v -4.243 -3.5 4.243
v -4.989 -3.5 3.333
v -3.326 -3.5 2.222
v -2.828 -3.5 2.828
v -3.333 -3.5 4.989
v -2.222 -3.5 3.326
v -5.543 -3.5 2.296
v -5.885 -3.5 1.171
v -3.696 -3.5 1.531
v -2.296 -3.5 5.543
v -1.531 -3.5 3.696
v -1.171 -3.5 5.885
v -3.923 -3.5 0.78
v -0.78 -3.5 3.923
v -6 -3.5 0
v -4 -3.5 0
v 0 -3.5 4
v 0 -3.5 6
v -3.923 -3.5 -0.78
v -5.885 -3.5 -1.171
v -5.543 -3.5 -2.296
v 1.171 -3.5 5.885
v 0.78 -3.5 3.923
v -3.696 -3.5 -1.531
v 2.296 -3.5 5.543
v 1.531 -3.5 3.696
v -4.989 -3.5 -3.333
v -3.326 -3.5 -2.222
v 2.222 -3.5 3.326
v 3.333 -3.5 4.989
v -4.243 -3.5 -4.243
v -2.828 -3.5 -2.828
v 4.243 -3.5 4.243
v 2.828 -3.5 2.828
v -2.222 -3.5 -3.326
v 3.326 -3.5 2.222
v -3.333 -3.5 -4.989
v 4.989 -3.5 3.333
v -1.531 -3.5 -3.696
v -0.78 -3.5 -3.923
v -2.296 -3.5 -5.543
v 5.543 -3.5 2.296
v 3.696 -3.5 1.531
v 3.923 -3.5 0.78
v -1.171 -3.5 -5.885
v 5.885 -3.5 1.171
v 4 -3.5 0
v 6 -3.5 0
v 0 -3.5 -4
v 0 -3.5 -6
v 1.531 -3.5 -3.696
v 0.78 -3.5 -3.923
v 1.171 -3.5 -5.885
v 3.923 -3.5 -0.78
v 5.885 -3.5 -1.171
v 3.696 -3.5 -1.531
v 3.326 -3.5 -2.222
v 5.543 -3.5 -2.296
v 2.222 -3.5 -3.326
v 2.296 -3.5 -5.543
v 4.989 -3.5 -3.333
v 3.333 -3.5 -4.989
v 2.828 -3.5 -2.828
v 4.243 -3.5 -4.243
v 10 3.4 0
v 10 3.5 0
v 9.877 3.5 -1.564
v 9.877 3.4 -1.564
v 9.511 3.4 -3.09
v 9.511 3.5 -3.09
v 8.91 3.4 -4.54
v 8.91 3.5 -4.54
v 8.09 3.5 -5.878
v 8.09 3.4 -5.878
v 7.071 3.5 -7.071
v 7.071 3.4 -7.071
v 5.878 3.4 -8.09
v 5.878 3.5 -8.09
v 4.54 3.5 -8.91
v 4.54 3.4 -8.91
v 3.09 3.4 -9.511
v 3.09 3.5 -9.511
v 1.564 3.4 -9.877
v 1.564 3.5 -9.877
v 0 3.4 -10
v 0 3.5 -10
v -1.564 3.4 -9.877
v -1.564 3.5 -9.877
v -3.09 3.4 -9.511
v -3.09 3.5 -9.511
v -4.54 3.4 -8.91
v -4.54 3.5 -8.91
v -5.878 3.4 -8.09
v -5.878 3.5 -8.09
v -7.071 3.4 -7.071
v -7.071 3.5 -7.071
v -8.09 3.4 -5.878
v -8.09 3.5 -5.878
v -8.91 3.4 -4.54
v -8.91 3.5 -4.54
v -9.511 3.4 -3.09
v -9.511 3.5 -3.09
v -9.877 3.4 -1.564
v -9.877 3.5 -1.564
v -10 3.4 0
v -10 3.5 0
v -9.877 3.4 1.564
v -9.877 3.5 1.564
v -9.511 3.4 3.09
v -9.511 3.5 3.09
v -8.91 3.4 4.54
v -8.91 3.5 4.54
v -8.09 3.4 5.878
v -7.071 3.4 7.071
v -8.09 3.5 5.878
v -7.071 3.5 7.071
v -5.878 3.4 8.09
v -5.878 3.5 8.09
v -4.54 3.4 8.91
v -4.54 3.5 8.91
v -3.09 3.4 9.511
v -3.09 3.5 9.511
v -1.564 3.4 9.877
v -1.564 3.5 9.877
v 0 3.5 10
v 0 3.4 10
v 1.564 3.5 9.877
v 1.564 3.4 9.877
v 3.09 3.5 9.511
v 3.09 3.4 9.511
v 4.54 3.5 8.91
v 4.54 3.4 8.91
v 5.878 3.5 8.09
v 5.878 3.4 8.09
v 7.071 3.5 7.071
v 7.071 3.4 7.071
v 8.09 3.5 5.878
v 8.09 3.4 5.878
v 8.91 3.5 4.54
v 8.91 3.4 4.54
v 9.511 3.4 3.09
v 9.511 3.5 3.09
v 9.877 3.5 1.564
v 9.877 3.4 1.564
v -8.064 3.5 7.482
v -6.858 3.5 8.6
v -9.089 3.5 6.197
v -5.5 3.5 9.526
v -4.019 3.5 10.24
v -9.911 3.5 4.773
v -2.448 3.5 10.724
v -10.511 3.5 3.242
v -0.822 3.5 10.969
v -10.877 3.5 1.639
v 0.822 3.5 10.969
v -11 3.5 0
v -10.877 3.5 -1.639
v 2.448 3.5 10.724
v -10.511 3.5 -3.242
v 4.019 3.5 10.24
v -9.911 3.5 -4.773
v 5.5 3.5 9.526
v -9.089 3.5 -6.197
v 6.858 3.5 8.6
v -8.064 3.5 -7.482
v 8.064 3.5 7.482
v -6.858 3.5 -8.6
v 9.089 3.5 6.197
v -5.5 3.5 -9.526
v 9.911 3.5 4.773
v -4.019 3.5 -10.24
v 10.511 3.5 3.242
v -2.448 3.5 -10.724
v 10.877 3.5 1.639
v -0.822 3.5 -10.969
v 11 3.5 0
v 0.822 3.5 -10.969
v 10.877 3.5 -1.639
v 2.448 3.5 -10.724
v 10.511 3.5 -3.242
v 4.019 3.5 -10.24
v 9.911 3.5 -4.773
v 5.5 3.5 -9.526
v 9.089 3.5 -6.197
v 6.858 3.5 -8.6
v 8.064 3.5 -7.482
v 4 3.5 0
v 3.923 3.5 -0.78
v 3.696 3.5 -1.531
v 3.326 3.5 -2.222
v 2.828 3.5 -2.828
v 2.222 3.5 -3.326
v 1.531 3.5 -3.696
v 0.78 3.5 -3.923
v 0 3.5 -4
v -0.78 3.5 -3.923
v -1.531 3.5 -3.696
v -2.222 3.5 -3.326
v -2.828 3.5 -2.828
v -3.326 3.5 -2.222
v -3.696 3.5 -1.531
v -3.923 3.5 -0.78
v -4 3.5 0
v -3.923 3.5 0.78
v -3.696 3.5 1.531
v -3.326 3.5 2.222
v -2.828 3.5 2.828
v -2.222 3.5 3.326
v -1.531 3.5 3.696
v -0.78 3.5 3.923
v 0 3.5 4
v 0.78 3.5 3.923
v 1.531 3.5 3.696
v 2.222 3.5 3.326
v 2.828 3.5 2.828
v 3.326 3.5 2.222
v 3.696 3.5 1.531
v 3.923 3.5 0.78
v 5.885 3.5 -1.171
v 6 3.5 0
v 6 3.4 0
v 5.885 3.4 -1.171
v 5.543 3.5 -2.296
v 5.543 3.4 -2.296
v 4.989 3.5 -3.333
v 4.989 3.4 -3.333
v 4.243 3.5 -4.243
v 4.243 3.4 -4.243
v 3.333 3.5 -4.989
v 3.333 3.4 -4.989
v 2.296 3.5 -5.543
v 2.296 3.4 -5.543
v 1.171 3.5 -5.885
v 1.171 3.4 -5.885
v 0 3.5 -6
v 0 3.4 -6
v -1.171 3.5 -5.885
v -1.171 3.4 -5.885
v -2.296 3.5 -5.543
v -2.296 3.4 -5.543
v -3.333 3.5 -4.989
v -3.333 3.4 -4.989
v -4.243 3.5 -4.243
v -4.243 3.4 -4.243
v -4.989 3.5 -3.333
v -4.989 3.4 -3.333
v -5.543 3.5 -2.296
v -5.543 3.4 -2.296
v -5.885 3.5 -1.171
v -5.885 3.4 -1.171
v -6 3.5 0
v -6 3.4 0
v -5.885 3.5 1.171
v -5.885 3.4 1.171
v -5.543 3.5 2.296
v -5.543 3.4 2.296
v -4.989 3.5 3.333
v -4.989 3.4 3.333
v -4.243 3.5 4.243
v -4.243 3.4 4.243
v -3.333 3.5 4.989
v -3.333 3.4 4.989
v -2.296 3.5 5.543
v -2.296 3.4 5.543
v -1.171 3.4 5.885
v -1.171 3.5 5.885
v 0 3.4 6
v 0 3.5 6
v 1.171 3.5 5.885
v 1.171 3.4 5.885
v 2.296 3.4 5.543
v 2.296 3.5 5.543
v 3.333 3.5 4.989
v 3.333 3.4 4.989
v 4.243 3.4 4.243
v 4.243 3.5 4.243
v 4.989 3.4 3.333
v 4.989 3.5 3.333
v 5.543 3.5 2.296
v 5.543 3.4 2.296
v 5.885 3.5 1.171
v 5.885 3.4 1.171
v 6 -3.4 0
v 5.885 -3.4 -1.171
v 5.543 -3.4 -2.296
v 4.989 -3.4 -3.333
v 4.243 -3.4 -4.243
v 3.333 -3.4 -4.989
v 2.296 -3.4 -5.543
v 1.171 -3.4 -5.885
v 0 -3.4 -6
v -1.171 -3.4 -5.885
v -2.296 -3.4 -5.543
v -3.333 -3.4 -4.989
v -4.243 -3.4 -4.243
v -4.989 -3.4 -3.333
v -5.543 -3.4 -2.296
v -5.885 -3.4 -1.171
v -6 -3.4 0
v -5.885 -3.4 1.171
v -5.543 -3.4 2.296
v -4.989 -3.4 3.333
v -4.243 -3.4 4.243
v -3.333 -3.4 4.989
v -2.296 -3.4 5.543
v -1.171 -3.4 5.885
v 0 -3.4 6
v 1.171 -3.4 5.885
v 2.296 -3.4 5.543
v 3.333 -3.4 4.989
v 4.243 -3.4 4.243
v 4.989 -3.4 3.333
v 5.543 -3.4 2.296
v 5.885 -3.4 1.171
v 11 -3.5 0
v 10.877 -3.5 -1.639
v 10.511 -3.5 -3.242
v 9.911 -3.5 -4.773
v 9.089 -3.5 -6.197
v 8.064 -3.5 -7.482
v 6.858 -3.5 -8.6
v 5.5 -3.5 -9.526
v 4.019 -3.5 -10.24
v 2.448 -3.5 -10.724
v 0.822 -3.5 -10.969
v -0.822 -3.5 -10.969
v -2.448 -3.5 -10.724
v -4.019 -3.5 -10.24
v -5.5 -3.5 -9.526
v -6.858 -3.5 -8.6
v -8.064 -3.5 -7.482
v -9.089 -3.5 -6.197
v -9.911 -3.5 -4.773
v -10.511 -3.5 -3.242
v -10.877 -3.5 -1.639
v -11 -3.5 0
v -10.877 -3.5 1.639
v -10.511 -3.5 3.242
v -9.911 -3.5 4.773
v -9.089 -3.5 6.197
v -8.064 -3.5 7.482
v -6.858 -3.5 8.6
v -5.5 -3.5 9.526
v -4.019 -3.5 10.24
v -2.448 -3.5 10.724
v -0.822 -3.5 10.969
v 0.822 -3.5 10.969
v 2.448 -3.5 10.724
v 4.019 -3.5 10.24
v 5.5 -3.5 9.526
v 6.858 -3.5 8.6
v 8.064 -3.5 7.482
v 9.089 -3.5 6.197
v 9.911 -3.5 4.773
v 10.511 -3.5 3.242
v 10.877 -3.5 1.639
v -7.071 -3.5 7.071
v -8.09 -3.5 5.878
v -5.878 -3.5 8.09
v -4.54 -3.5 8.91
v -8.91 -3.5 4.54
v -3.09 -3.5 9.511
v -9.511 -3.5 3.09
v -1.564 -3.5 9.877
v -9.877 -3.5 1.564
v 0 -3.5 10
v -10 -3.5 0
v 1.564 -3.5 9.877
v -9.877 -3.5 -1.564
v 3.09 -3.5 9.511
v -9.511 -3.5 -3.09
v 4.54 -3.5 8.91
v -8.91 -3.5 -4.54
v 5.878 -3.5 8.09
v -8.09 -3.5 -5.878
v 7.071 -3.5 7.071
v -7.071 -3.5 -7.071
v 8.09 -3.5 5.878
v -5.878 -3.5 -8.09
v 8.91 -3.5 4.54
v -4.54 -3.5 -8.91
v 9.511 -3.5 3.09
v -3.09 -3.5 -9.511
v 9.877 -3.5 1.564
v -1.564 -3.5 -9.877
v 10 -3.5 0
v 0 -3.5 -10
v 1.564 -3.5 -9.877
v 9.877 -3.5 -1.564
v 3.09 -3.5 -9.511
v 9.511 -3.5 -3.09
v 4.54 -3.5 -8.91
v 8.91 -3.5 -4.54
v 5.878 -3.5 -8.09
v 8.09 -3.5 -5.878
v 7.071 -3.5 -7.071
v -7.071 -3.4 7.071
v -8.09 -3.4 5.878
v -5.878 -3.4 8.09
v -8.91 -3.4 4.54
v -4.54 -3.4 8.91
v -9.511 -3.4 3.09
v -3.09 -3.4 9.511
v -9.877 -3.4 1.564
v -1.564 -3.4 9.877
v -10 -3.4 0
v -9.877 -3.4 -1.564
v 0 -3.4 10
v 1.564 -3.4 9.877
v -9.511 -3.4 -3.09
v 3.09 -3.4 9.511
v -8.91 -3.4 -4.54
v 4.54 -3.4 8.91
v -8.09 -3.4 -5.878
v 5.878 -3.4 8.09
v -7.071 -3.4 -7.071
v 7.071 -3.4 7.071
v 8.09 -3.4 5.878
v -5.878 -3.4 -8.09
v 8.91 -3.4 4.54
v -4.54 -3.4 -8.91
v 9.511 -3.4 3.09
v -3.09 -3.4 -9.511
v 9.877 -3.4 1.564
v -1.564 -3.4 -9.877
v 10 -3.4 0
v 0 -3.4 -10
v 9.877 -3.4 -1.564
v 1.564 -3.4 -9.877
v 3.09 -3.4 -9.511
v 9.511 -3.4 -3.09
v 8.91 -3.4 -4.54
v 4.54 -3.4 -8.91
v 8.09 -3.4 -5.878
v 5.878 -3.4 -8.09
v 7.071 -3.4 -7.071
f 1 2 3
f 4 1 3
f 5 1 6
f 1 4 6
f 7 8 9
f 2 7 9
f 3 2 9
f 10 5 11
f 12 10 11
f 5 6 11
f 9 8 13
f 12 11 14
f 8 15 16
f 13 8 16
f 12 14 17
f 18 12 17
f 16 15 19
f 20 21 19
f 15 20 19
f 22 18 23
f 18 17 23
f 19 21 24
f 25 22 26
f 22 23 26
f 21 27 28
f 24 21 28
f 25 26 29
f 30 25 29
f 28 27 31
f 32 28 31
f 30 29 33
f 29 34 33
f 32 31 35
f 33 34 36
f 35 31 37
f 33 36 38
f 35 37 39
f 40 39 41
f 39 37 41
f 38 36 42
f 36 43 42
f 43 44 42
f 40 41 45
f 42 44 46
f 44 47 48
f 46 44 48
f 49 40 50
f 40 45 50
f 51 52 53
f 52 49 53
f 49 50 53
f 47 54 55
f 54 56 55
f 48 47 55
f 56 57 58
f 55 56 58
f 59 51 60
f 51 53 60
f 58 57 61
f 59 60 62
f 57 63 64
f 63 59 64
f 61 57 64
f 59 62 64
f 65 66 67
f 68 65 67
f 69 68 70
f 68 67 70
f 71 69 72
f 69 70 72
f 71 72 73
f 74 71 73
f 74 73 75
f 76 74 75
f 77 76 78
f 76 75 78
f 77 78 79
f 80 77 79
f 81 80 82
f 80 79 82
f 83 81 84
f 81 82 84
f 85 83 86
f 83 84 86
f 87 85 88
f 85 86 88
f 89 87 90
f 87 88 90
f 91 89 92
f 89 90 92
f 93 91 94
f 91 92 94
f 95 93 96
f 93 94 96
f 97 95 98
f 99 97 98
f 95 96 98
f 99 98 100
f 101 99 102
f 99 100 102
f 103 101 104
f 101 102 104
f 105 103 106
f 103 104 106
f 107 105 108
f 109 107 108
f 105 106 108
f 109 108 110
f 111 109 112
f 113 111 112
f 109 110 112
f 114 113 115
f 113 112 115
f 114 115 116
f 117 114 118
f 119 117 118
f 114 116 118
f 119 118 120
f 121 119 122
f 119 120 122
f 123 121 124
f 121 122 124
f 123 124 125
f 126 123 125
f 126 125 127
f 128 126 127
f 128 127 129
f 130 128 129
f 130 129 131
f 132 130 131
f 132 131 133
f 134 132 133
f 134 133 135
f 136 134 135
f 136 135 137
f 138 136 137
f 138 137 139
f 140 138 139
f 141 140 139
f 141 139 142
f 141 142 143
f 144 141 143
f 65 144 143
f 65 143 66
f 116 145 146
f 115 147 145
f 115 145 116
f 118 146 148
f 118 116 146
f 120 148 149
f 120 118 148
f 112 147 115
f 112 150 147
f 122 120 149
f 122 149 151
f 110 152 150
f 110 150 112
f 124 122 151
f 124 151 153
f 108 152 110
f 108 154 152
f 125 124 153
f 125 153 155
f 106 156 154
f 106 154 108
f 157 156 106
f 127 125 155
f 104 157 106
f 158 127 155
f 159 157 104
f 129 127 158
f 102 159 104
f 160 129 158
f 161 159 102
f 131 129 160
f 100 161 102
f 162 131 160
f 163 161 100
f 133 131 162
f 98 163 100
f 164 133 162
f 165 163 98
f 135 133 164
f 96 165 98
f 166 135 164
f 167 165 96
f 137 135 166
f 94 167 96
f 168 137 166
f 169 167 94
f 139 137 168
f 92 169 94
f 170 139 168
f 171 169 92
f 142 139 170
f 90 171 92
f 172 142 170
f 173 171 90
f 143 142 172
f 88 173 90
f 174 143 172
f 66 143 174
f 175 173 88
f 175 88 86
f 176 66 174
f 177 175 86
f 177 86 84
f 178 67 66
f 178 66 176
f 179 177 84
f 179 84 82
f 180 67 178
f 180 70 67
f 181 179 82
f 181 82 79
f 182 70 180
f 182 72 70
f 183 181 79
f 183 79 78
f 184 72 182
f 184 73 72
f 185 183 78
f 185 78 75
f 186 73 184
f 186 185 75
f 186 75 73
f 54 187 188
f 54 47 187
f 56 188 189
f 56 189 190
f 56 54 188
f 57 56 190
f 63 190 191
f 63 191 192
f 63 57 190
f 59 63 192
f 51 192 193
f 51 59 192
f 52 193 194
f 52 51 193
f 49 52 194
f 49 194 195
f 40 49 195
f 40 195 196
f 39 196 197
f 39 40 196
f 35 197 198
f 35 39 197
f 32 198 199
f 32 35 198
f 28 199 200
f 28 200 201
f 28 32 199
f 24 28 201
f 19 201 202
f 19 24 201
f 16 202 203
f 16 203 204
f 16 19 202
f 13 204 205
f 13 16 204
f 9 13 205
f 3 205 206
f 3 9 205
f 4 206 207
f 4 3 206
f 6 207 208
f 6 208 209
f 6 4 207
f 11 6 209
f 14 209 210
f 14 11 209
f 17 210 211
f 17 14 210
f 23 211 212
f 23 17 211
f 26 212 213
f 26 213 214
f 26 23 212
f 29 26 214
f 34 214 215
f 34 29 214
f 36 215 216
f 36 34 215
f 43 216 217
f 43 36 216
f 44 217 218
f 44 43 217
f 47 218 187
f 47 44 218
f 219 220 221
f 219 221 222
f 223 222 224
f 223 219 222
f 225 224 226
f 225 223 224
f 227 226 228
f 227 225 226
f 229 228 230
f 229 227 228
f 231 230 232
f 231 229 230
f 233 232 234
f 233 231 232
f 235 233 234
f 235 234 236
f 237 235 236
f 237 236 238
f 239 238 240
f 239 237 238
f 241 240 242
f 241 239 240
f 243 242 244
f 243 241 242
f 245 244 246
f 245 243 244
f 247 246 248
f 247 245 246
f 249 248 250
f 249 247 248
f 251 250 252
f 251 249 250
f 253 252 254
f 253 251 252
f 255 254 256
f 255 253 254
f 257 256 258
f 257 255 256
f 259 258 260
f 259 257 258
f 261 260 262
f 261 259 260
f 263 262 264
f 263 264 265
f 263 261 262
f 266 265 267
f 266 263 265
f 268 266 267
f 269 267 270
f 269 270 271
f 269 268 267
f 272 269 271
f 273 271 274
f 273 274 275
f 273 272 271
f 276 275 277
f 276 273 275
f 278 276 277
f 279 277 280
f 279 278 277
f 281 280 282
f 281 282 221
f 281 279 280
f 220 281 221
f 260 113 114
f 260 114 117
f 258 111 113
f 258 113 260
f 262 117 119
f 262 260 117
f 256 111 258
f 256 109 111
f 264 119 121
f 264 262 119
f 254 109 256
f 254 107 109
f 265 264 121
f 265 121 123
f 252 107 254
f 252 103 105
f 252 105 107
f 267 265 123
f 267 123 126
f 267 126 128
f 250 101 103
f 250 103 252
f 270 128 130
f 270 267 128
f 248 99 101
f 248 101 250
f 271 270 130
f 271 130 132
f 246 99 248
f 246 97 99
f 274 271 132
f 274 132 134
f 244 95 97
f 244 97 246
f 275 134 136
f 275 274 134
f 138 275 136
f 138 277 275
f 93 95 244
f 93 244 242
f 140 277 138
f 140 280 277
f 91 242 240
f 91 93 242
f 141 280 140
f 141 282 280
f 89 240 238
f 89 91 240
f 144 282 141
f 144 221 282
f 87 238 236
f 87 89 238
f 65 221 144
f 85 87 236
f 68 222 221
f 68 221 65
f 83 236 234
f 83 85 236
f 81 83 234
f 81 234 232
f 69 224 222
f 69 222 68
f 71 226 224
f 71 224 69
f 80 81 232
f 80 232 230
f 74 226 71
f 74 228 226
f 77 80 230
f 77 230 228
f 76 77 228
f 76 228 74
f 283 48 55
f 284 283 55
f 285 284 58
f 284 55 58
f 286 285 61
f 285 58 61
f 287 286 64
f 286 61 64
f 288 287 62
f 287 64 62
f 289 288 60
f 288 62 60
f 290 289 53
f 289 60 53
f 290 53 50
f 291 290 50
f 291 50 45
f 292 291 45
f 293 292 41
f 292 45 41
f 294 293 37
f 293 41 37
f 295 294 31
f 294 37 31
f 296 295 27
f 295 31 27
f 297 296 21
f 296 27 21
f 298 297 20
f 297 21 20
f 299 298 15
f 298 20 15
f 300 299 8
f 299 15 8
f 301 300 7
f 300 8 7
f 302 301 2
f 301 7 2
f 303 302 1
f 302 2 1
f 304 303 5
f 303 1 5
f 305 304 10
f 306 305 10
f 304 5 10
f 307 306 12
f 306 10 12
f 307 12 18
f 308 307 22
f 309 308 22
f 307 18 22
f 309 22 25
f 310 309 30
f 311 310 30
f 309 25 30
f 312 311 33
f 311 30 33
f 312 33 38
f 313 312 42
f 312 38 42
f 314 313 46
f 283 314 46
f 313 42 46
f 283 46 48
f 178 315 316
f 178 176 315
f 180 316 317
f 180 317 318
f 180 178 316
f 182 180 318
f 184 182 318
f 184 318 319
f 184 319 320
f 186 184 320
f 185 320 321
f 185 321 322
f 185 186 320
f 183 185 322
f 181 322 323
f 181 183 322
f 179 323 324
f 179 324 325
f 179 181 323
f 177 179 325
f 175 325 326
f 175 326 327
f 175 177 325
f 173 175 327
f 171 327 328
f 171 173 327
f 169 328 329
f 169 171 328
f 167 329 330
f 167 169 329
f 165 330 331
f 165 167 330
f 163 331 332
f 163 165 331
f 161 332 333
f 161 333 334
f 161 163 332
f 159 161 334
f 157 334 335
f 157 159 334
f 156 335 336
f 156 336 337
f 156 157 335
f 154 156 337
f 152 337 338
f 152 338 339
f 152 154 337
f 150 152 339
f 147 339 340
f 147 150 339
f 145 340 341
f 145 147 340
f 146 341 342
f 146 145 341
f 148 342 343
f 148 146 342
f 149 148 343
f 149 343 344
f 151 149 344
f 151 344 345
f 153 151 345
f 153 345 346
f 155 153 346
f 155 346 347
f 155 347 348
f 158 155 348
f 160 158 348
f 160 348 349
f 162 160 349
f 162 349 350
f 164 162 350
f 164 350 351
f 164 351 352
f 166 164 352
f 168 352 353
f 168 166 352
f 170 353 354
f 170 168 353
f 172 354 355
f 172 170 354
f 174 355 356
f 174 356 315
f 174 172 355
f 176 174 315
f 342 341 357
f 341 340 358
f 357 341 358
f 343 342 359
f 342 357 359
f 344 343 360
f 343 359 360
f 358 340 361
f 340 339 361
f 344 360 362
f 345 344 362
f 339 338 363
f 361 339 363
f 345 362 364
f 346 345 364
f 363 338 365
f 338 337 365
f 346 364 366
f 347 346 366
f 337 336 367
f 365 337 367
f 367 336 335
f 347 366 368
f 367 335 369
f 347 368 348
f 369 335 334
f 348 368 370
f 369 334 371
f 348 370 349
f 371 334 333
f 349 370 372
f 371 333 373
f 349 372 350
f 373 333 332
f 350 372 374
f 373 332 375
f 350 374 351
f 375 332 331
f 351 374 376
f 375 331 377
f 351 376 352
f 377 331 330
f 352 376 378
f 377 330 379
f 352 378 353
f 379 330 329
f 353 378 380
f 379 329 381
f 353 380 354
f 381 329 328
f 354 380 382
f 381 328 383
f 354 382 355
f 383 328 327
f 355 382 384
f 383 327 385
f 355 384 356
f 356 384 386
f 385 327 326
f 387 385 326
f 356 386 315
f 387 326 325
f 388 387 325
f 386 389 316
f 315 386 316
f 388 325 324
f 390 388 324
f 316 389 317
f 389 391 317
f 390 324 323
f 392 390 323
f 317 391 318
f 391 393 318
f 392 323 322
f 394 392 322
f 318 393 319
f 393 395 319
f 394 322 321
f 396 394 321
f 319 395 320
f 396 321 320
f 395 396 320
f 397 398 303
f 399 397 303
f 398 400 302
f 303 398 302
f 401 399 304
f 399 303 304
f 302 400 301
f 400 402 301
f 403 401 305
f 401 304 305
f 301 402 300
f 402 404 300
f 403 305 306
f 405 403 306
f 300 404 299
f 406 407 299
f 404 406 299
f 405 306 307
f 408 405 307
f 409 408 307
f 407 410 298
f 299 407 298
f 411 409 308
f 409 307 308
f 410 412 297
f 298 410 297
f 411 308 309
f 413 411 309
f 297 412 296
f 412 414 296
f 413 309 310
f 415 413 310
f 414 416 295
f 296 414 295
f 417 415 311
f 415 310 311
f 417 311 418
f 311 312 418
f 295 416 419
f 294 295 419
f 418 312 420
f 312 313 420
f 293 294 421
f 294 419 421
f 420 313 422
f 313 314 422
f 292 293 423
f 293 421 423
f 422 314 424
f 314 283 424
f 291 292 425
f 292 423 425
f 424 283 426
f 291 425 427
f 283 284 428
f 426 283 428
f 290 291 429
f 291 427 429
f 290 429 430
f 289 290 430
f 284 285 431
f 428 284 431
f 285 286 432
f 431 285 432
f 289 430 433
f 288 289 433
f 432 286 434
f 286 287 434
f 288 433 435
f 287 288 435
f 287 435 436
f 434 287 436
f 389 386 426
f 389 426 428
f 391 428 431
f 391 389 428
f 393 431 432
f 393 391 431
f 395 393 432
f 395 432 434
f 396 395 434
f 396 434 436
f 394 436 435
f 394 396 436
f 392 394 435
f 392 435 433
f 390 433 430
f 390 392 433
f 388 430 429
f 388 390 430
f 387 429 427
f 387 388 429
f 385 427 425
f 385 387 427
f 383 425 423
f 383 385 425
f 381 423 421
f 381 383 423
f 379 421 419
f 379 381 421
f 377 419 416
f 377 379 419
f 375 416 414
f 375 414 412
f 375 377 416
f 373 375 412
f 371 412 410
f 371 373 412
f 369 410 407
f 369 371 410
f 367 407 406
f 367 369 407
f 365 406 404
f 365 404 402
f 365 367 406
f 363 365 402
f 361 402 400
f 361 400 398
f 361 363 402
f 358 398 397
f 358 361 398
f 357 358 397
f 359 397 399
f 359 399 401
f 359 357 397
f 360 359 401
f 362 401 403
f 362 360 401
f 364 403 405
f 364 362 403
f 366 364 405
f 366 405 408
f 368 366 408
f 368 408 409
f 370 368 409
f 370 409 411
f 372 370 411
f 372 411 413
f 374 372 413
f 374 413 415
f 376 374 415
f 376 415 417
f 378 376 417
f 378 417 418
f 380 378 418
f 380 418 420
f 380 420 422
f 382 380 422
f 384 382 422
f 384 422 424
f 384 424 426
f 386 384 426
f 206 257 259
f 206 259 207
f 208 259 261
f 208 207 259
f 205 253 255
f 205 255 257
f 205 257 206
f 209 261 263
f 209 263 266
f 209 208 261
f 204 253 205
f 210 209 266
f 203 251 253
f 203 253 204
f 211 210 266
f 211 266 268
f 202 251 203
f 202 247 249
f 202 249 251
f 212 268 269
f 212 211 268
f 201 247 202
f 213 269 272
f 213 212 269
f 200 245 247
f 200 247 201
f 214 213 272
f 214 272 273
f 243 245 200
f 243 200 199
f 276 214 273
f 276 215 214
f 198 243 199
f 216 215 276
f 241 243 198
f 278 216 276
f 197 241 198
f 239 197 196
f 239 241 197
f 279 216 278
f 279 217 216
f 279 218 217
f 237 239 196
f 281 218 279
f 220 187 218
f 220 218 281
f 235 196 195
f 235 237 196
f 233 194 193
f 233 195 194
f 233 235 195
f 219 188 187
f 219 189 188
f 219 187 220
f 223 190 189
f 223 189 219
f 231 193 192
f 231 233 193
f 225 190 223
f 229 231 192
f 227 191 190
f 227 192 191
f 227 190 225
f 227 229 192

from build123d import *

# Parameters (mm, degrees)
SKETCH1_R           = 11
SKETCH1_R_2         = 4
BOSS_EXTRUDE1_DEPTH = 3.5
SKETCH2_R           = 10
SKETCH2_R_2         = 6
CUT_EXTRUDE1_DEPTH  = 0.1


with BuildPart() as part:
    # Sketch1 → Boss-Extrude1 (new body, symmetric)
    with BuildSketch(Plane(origin=(0, 0, 0), x_dir=(1, 0, 0), z_dir=(0, 1, 0))):
        Circle(SKETCH1_R)
        Circle(SKETCH1_R_2, mode=Mode.SUBTRACT)
    extrude(amount=BOSS_EXTRUDE1_DEPTH, both=True)

    # Sketch2 → Cut-Extrude1 (cut)
    with BuildSketch(Plane(origin=(0, 3.5, 0), x_dir=(1, 0, 0), z_dir=(0, 1, 0))):
        Circle(SKETCH2_R)
        Circle(SKETCH2_R_2, mode=Mode.SUBTRACT)
    cut_extrude1 = extrude(amount=-CUT_EXTRUDE1_DEPTH, mode=Mode.SUBTRACT)

    # Mirror1: Cut-Extrude1 across plane
    add(cut_extrude1.mirror(Plane.ZX), mode=Mode.SUBTRACT)


solid = part.part
